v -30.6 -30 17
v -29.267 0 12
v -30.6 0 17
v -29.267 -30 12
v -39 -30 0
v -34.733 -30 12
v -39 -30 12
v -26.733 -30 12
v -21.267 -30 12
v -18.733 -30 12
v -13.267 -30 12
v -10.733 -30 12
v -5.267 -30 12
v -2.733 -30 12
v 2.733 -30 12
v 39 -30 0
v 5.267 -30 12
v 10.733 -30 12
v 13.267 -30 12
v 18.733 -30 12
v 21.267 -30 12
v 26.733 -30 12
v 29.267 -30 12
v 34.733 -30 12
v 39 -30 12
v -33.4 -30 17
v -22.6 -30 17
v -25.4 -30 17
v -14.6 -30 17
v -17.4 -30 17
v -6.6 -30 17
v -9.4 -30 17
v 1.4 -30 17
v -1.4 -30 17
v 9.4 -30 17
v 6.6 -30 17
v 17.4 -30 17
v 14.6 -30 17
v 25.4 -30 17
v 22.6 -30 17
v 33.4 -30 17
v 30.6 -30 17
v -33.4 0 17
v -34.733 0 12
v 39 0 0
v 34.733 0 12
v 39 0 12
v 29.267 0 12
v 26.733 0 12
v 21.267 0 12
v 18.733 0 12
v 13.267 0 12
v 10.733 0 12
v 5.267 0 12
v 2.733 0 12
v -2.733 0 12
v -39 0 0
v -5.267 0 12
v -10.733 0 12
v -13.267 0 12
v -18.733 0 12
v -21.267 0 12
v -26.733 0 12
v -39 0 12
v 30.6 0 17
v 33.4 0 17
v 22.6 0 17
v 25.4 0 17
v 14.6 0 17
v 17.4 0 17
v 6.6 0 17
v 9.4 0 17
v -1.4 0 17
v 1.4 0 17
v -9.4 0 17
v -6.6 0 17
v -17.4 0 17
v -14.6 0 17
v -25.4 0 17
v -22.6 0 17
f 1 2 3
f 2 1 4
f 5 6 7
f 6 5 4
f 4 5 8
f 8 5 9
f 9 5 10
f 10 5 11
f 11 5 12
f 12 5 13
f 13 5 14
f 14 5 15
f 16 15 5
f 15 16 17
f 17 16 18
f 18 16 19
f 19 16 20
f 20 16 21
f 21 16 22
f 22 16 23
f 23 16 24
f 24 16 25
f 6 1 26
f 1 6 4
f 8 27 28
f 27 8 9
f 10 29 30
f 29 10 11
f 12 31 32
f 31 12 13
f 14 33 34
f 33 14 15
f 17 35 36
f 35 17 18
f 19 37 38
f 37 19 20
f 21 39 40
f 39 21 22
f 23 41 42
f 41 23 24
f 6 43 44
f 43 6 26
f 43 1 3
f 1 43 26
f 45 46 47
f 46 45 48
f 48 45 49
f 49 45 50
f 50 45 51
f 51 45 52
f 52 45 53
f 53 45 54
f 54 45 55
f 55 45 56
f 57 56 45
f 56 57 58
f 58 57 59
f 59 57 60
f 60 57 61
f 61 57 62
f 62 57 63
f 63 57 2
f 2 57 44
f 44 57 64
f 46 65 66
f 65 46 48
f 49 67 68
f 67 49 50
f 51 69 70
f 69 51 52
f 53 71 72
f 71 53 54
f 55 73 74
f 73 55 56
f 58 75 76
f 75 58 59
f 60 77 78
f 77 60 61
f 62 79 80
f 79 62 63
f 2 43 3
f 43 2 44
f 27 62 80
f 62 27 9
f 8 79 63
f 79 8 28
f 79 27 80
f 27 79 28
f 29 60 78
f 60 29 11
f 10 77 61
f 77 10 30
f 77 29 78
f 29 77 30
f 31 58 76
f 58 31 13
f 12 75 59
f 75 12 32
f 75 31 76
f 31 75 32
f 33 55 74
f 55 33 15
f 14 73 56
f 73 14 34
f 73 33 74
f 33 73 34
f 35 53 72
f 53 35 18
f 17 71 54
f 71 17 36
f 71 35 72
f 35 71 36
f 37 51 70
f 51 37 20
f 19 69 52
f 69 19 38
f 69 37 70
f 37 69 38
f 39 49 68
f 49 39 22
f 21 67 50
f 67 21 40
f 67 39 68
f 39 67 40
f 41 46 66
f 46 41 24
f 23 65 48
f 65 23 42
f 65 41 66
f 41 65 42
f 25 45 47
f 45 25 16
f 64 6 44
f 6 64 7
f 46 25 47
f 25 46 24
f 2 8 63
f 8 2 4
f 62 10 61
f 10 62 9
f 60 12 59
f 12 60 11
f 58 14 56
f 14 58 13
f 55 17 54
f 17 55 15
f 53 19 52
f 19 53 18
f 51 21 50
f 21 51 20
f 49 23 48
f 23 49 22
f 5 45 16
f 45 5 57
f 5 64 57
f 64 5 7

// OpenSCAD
$fn = 32;

// ----------------------------------------------------------------------
// Toothed rack, 9 teeth
// 8 mm pitch, 5 mm teeth
// ----------------------------------------------------------------------

// --- parameters (mm) ---
bar_w = 30;     // bar width (Y)
bar_h = 12;     // bar height (Z)
teeth = 9;      // number of teeth
pitch = 8;      // tooth pitch
tooth_h = 5;    // tooth height above the bar
root_w = 6;     // tooth width at the root
crest_w = 2.8;  // tooth width at the crest

// --- derived feature positions (mm) ---
span = (teeth - 1) * pitch;  // = 64   distance between the outer teeth
bar_l = span + root_w + 8;   // = 78   bar length: teeth plus 4 mm at each end
tooth_x = -span / 2;         // = -32   X of the first tooth
height = bar_h + tooth_h;    // = 17   overall height
feature_centers = [
  [tooth_x + 0 * pitch, -bar_w / 2],
  [tooth_x + 1 * pitch, -bar_w / 2],
  [tooth_x + 2 * pitch, -bar_w / 2],
  [tooth_x + 3 * pitch, -bar_w / 2],
  [tooth_x + 4 * pitch, -bar_w / 2],
  [tooth_x + 5 * pitch, -bar_w / 2],
  [tooth_x + 6 * pitch, -bar_w / 2],
  [tooth_x + 7 * pitch, -bar_w / 2],
  [tooth_x + 8 * pitch, -bar_w / 2]
];   // tooth centre line, drives the tooth loop

// bar with a rack of teeth, one extruded trapezoium per centre
module rack_tooth() {
  linear_extrude(height = bar_w)
    polygon(points = [
      [0, 0],
      [root_w, 0],
      [root_w / 2 + crest_w / 2, tooth_h + 1],
      [root_w / 2 - crest_w / 2, tooth_h + 1]
    ]);
}

union() {
  translate([-bar_l / 2, -bar_w, 0]) cube([bar_l, bar_w, bar_h]);
  for (centre = feature_centers)
    translate([centre[0] - root_w / 2, 0, bar_h - 1]) rotate([90, 0, 0]) rack_tooth();
}
